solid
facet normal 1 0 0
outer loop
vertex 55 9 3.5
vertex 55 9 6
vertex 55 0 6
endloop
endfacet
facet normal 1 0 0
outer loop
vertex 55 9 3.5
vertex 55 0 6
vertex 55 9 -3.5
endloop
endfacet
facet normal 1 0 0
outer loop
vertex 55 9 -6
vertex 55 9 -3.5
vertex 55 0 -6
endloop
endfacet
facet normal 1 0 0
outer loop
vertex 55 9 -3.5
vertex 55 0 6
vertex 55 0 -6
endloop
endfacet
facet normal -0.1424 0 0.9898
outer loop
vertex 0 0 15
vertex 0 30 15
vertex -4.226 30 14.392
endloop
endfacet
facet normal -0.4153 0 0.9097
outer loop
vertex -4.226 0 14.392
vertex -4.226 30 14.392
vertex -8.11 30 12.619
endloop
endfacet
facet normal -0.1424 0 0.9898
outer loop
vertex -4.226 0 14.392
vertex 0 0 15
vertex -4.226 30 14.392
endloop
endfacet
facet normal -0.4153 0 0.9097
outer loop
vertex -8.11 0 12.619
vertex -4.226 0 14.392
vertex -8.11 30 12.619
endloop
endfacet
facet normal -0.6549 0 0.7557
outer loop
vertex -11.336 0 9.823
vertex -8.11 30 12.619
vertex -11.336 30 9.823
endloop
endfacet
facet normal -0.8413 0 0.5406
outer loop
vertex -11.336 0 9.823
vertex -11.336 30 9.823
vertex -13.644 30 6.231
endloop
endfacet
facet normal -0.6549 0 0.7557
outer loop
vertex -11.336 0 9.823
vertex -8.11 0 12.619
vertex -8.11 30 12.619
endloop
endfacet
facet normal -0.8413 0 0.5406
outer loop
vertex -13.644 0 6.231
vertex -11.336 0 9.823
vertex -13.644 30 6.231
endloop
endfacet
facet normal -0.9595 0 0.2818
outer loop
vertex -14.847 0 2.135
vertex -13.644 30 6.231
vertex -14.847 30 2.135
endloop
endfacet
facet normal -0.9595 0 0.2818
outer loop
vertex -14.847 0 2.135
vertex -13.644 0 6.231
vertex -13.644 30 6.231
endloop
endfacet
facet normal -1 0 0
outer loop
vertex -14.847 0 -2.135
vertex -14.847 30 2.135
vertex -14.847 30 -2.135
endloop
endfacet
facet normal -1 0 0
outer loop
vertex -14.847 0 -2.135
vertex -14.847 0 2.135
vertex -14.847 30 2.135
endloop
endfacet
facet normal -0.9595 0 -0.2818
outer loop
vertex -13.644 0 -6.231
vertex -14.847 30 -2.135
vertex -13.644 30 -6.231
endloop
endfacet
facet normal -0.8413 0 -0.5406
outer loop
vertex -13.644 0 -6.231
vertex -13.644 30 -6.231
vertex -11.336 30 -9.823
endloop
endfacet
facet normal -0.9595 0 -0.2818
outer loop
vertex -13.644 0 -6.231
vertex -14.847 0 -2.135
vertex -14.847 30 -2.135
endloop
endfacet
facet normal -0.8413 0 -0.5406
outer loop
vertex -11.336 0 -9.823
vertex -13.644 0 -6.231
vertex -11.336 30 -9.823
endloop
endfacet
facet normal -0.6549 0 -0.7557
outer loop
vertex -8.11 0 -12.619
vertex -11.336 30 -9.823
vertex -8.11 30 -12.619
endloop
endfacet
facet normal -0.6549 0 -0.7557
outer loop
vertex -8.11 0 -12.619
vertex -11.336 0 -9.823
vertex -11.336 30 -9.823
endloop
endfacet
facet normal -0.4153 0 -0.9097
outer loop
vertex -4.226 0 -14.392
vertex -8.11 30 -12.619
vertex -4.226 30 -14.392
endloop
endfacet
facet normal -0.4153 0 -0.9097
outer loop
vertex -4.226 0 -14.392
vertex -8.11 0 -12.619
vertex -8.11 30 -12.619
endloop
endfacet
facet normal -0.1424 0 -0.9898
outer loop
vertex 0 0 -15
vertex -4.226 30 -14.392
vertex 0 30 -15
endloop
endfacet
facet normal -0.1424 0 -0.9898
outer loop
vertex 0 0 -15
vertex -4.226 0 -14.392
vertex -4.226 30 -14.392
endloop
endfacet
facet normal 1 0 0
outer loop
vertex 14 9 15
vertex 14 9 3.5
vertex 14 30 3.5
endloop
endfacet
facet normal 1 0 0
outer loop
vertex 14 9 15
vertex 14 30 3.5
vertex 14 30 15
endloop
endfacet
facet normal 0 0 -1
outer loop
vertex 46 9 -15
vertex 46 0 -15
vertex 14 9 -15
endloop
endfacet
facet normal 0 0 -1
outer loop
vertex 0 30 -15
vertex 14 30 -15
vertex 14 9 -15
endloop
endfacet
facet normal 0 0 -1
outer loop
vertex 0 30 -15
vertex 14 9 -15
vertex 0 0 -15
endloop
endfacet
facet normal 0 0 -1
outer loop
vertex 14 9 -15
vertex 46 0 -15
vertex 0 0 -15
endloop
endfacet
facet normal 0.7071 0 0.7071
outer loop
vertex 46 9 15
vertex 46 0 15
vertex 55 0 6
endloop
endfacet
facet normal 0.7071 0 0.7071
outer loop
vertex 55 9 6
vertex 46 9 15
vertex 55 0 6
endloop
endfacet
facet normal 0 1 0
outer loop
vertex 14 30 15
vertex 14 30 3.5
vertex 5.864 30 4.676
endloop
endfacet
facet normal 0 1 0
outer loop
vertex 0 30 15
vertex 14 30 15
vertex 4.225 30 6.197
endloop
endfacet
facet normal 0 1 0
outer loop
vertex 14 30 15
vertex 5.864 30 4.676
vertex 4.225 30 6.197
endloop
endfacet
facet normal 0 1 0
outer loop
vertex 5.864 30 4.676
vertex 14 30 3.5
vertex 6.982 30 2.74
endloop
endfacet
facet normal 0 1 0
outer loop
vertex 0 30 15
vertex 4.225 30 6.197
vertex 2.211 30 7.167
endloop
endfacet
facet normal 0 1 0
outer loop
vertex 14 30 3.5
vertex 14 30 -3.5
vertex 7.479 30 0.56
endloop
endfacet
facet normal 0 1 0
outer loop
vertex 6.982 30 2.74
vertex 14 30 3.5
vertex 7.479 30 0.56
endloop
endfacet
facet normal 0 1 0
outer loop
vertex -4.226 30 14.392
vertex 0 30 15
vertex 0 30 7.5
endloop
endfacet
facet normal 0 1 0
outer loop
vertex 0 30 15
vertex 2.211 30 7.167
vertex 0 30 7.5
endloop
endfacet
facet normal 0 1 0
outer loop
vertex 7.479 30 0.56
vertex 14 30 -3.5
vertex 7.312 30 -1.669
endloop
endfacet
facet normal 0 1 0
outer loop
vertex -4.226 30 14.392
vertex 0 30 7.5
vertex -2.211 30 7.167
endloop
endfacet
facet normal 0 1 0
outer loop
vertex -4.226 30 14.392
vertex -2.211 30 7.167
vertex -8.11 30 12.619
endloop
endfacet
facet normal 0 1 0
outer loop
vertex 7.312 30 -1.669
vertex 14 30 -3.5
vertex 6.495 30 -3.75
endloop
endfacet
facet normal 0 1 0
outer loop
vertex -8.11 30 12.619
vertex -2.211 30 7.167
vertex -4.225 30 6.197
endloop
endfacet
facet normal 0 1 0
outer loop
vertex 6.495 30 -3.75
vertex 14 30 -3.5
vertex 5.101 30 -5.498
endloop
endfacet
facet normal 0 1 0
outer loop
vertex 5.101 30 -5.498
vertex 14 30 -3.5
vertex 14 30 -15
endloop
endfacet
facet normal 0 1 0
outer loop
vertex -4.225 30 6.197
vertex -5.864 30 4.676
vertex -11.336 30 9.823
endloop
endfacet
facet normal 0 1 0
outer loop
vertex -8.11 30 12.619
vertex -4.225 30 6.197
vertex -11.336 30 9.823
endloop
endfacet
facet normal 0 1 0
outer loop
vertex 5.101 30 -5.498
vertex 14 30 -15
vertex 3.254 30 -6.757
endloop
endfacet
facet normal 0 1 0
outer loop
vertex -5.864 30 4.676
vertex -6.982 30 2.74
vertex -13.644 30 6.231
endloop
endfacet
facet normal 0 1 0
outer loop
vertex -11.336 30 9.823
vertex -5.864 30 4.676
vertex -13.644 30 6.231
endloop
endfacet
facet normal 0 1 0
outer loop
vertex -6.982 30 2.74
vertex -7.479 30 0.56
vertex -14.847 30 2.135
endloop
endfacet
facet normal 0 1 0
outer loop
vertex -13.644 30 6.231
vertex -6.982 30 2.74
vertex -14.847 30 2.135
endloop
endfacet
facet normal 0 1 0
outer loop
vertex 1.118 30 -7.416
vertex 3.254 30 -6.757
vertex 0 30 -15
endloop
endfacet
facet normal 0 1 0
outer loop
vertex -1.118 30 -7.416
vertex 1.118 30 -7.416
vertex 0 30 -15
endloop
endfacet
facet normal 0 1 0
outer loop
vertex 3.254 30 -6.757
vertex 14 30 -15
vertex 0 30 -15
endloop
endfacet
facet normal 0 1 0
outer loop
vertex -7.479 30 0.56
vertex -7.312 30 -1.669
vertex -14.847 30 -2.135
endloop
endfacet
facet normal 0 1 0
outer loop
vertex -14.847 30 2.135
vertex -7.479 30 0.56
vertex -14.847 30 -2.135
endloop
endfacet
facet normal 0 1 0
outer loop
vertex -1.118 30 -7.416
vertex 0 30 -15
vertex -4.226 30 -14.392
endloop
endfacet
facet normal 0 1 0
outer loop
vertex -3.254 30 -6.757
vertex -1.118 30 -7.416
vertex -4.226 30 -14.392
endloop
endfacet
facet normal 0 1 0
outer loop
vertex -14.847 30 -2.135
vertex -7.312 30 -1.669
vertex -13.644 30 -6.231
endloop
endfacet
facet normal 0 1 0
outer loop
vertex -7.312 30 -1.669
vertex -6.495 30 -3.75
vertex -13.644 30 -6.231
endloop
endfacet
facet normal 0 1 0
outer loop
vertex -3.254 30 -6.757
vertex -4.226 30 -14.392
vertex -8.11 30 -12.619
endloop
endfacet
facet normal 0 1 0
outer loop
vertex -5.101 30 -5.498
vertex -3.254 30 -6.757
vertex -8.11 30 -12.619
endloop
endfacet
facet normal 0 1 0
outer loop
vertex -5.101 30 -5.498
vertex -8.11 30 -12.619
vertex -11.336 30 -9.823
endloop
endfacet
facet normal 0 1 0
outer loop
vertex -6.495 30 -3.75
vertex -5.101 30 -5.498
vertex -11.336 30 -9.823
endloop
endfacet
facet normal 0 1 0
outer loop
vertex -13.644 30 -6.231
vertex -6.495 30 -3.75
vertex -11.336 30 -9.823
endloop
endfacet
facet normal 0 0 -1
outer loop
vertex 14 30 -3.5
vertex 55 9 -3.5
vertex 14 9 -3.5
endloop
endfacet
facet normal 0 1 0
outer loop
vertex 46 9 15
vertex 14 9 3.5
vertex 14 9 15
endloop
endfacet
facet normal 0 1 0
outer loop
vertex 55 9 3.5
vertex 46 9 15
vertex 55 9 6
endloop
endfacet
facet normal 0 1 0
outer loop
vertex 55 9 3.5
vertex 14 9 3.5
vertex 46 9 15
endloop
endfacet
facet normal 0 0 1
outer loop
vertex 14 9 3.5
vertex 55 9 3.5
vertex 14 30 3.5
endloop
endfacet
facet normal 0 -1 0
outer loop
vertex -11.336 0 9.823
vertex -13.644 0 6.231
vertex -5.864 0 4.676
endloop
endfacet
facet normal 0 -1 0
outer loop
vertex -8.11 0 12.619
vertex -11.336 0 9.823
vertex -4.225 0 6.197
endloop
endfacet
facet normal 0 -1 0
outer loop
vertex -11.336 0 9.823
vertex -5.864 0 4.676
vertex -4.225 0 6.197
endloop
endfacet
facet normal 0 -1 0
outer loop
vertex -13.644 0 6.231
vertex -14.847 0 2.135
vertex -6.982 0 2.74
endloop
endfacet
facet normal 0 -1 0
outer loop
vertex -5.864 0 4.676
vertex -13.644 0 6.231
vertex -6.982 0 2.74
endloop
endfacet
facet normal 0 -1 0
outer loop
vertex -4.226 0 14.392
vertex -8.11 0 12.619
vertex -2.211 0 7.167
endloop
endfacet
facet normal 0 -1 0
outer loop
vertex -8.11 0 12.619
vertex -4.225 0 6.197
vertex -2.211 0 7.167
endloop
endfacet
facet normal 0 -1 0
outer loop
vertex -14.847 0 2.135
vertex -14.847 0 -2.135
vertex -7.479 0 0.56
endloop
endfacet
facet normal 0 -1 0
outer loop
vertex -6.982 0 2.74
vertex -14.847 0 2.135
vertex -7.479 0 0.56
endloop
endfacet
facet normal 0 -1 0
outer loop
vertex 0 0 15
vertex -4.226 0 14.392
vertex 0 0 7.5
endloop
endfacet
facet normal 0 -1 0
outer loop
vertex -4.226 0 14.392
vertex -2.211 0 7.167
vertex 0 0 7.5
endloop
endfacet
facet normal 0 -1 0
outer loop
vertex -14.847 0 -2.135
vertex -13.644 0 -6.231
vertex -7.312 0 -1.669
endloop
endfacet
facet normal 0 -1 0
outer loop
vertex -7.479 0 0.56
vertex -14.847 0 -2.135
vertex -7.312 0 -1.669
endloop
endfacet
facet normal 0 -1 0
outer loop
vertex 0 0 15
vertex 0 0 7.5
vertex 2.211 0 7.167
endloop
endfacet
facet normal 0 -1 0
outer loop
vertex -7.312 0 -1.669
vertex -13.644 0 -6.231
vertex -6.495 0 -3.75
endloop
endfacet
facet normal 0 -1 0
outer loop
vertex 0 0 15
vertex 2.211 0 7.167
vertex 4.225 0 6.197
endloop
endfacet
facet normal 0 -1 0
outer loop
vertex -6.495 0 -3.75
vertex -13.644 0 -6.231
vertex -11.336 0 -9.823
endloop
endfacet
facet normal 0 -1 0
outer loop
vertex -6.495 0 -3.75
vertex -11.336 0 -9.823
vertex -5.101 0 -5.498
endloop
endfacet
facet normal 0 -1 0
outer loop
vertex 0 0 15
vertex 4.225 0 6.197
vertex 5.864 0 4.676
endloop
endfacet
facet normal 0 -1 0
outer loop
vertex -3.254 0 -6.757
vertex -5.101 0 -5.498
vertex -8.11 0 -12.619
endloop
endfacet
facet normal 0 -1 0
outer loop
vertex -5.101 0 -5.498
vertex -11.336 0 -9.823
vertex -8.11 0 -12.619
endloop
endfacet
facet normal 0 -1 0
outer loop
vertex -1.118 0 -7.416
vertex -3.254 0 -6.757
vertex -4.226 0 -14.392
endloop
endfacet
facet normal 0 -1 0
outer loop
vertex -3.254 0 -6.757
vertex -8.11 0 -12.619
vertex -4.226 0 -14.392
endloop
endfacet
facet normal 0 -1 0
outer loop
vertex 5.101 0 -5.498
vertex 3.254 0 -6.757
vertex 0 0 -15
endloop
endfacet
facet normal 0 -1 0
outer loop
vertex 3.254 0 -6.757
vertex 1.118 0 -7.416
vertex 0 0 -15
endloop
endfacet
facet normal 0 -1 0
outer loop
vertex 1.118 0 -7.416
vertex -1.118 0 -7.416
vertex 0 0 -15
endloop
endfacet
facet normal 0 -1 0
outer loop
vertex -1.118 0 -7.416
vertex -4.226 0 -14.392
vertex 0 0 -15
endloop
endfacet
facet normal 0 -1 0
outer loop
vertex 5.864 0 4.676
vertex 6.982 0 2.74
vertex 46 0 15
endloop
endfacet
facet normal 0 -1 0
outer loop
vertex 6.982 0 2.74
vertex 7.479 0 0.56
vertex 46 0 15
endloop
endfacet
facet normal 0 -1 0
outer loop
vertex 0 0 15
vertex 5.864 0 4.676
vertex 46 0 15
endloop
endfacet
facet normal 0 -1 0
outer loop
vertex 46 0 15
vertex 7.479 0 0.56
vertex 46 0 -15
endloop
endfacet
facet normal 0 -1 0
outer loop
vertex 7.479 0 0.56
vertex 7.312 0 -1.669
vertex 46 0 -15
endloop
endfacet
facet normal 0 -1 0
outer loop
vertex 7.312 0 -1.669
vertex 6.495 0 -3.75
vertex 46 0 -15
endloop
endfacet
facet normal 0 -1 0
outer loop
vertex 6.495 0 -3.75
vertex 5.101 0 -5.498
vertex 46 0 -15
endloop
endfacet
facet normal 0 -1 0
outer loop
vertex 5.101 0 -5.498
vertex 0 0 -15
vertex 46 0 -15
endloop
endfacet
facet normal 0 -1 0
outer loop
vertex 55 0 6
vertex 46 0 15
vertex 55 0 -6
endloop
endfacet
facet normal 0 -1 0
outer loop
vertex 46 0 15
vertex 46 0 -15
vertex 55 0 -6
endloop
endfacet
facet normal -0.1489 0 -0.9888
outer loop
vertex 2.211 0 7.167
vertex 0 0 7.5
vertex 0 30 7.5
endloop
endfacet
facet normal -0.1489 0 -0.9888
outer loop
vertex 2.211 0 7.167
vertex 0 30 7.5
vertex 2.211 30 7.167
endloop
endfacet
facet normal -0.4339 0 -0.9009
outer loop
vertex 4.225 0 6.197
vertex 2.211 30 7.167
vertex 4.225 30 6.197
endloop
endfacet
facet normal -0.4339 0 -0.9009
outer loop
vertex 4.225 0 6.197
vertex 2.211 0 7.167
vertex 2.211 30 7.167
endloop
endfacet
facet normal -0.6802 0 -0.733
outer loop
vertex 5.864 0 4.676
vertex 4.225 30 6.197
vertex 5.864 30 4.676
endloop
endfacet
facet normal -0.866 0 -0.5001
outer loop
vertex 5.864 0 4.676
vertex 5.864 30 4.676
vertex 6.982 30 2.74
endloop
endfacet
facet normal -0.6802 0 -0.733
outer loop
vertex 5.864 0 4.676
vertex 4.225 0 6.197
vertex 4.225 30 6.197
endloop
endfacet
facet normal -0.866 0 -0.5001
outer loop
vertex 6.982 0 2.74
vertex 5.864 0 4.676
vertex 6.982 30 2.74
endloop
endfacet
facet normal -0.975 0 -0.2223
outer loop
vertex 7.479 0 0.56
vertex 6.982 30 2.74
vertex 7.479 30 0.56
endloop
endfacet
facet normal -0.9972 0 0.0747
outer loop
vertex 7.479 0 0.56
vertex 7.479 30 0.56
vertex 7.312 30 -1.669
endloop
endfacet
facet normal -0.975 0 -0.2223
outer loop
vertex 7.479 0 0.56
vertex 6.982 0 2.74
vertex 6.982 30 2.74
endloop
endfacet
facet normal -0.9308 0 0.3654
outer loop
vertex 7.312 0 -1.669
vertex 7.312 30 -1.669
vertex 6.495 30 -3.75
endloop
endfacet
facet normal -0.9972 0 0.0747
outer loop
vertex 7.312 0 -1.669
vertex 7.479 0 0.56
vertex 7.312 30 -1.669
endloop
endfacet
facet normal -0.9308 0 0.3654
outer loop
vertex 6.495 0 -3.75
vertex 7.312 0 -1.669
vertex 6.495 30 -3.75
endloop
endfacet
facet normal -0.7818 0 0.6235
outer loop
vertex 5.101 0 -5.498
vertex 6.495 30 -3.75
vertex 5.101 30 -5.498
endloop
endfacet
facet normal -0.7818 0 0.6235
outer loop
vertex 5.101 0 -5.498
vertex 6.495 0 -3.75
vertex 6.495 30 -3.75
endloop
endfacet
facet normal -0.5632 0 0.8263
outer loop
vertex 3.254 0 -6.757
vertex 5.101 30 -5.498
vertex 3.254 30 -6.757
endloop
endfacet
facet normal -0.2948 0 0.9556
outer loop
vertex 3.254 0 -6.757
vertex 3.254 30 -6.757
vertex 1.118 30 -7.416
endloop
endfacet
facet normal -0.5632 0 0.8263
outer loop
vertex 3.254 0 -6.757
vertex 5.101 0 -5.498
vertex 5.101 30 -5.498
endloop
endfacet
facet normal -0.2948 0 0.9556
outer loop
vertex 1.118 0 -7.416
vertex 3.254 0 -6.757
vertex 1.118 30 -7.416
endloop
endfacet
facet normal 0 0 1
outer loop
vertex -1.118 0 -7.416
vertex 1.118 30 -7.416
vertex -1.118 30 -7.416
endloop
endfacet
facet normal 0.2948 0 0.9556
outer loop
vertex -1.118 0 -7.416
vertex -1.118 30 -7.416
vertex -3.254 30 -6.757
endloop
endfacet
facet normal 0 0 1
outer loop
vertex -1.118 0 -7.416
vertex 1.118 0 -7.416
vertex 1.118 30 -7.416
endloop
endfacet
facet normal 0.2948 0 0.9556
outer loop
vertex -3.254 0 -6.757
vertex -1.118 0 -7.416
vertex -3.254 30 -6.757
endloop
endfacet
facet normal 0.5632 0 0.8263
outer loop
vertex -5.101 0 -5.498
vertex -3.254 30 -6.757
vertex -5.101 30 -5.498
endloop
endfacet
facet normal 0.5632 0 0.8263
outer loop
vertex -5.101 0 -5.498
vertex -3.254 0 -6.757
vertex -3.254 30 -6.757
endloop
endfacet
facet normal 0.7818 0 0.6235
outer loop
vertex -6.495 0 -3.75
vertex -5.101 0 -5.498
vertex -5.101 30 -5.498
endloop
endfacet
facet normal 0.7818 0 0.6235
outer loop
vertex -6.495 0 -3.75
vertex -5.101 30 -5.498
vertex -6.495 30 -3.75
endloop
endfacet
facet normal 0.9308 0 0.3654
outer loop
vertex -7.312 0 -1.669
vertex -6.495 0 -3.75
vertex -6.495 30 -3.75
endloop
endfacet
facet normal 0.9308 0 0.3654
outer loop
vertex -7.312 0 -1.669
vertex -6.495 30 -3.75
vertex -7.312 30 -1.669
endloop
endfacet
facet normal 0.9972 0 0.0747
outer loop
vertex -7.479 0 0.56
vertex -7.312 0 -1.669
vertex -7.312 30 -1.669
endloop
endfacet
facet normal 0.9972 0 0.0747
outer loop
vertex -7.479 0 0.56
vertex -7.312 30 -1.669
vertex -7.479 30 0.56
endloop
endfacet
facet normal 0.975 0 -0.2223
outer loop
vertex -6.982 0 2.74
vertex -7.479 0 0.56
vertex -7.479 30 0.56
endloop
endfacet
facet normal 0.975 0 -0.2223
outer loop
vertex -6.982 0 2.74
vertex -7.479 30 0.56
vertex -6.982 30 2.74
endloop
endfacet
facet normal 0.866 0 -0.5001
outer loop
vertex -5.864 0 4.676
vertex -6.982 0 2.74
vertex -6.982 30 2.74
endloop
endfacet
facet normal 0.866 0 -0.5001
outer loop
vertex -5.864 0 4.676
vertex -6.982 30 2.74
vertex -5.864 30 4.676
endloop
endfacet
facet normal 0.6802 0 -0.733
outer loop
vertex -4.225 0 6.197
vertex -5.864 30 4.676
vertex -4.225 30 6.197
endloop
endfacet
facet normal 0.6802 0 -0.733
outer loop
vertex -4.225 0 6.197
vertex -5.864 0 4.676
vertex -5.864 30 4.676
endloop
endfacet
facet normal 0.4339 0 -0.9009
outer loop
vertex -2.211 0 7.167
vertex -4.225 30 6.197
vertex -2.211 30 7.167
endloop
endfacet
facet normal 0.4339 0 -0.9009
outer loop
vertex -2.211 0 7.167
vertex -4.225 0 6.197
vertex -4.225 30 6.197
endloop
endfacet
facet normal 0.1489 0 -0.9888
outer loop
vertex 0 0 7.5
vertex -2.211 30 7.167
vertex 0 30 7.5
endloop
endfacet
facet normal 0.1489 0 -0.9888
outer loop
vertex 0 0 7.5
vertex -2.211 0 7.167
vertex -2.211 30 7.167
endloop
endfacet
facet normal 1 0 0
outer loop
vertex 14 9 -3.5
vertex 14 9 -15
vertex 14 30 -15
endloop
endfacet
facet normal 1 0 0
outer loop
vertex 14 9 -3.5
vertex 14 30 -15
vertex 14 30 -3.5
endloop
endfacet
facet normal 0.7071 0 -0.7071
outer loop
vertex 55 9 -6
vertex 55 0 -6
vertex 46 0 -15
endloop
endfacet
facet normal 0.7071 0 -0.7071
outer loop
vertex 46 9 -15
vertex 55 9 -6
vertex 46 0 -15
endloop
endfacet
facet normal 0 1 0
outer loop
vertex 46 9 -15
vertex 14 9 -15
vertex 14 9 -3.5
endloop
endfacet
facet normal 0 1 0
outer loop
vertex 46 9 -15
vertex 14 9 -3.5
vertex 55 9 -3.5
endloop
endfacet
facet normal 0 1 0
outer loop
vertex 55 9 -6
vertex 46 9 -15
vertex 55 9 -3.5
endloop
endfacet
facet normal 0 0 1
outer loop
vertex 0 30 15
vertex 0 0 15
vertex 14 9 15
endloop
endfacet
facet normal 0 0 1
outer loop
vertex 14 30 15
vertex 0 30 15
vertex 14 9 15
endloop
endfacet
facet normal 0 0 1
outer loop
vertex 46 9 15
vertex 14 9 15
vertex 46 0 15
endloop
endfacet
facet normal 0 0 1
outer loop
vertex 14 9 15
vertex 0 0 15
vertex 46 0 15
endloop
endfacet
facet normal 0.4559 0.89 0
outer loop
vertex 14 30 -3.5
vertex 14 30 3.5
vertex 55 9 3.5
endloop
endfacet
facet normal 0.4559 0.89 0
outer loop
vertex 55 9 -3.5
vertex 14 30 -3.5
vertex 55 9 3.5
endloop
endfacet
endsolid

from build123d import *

# Parameters (mm, degrees)
EXTRUDE_1_DEPTH = 30
EXTRUDE_2_DEPTH = 9
EXTRUDE_START   = -15
EXTRUDE_3_DEPTH = 3.5


with BuildPart() as part:
    # 스케치1 → 보스-돌출1 (new body)
    with BuildSketch(Plane(origin=(0, 0, 0), x_dir=(1, 0, 0), z_dir=(0, 1, 0))):
        with BuildLine():
            Line((0, -15), (14, -15))
            Line((14, -15), (14, 15))
            Line((14, 15), (0, 15))
            ThreePointArc((0, 15), (-15, 0), (0, -15))
        make_face()
        with BuildLine():
            ThreePointArc((7.5, 0), (5.303300859, -5.303300859), (0, -7.5))
            ThreePointArc((0, -7.5), (-7.5, 0), (0, 7.5))
            ThreePointArc((0, 7.5), (5.303300859, 5.303300859), (7.5, 0))
        make_face(mode=Mode.SUBTRACT)
    extrude(amount=EXTRUDE_1_DEPTH)

    # 스케치1<3> → 보스-돌출2 (add)
    with BuildSketch(Plane(origin=(0, 0, 0), x_dir=(1, 0, 0), z_dir=(0, 1, 0))):
        Polygon((14, 15), (14, -15), (46, -15), (55, -6), (55, 6), (46, 15), align=None)
    extrude(amount=EXTRUDE_2_DEPTH)

    # 스케치2 → 보스-돌출3 (add, symmetric)
    with BuildSketch(Plane.XY.offset(15).offset(EXTRUDE_START)):
        Polygon((14, 30), (55, 9), (14, 9), align=None)
    extrude(amount=EXTRUDE_3_DEPTH, both=True)


solid = part.part
